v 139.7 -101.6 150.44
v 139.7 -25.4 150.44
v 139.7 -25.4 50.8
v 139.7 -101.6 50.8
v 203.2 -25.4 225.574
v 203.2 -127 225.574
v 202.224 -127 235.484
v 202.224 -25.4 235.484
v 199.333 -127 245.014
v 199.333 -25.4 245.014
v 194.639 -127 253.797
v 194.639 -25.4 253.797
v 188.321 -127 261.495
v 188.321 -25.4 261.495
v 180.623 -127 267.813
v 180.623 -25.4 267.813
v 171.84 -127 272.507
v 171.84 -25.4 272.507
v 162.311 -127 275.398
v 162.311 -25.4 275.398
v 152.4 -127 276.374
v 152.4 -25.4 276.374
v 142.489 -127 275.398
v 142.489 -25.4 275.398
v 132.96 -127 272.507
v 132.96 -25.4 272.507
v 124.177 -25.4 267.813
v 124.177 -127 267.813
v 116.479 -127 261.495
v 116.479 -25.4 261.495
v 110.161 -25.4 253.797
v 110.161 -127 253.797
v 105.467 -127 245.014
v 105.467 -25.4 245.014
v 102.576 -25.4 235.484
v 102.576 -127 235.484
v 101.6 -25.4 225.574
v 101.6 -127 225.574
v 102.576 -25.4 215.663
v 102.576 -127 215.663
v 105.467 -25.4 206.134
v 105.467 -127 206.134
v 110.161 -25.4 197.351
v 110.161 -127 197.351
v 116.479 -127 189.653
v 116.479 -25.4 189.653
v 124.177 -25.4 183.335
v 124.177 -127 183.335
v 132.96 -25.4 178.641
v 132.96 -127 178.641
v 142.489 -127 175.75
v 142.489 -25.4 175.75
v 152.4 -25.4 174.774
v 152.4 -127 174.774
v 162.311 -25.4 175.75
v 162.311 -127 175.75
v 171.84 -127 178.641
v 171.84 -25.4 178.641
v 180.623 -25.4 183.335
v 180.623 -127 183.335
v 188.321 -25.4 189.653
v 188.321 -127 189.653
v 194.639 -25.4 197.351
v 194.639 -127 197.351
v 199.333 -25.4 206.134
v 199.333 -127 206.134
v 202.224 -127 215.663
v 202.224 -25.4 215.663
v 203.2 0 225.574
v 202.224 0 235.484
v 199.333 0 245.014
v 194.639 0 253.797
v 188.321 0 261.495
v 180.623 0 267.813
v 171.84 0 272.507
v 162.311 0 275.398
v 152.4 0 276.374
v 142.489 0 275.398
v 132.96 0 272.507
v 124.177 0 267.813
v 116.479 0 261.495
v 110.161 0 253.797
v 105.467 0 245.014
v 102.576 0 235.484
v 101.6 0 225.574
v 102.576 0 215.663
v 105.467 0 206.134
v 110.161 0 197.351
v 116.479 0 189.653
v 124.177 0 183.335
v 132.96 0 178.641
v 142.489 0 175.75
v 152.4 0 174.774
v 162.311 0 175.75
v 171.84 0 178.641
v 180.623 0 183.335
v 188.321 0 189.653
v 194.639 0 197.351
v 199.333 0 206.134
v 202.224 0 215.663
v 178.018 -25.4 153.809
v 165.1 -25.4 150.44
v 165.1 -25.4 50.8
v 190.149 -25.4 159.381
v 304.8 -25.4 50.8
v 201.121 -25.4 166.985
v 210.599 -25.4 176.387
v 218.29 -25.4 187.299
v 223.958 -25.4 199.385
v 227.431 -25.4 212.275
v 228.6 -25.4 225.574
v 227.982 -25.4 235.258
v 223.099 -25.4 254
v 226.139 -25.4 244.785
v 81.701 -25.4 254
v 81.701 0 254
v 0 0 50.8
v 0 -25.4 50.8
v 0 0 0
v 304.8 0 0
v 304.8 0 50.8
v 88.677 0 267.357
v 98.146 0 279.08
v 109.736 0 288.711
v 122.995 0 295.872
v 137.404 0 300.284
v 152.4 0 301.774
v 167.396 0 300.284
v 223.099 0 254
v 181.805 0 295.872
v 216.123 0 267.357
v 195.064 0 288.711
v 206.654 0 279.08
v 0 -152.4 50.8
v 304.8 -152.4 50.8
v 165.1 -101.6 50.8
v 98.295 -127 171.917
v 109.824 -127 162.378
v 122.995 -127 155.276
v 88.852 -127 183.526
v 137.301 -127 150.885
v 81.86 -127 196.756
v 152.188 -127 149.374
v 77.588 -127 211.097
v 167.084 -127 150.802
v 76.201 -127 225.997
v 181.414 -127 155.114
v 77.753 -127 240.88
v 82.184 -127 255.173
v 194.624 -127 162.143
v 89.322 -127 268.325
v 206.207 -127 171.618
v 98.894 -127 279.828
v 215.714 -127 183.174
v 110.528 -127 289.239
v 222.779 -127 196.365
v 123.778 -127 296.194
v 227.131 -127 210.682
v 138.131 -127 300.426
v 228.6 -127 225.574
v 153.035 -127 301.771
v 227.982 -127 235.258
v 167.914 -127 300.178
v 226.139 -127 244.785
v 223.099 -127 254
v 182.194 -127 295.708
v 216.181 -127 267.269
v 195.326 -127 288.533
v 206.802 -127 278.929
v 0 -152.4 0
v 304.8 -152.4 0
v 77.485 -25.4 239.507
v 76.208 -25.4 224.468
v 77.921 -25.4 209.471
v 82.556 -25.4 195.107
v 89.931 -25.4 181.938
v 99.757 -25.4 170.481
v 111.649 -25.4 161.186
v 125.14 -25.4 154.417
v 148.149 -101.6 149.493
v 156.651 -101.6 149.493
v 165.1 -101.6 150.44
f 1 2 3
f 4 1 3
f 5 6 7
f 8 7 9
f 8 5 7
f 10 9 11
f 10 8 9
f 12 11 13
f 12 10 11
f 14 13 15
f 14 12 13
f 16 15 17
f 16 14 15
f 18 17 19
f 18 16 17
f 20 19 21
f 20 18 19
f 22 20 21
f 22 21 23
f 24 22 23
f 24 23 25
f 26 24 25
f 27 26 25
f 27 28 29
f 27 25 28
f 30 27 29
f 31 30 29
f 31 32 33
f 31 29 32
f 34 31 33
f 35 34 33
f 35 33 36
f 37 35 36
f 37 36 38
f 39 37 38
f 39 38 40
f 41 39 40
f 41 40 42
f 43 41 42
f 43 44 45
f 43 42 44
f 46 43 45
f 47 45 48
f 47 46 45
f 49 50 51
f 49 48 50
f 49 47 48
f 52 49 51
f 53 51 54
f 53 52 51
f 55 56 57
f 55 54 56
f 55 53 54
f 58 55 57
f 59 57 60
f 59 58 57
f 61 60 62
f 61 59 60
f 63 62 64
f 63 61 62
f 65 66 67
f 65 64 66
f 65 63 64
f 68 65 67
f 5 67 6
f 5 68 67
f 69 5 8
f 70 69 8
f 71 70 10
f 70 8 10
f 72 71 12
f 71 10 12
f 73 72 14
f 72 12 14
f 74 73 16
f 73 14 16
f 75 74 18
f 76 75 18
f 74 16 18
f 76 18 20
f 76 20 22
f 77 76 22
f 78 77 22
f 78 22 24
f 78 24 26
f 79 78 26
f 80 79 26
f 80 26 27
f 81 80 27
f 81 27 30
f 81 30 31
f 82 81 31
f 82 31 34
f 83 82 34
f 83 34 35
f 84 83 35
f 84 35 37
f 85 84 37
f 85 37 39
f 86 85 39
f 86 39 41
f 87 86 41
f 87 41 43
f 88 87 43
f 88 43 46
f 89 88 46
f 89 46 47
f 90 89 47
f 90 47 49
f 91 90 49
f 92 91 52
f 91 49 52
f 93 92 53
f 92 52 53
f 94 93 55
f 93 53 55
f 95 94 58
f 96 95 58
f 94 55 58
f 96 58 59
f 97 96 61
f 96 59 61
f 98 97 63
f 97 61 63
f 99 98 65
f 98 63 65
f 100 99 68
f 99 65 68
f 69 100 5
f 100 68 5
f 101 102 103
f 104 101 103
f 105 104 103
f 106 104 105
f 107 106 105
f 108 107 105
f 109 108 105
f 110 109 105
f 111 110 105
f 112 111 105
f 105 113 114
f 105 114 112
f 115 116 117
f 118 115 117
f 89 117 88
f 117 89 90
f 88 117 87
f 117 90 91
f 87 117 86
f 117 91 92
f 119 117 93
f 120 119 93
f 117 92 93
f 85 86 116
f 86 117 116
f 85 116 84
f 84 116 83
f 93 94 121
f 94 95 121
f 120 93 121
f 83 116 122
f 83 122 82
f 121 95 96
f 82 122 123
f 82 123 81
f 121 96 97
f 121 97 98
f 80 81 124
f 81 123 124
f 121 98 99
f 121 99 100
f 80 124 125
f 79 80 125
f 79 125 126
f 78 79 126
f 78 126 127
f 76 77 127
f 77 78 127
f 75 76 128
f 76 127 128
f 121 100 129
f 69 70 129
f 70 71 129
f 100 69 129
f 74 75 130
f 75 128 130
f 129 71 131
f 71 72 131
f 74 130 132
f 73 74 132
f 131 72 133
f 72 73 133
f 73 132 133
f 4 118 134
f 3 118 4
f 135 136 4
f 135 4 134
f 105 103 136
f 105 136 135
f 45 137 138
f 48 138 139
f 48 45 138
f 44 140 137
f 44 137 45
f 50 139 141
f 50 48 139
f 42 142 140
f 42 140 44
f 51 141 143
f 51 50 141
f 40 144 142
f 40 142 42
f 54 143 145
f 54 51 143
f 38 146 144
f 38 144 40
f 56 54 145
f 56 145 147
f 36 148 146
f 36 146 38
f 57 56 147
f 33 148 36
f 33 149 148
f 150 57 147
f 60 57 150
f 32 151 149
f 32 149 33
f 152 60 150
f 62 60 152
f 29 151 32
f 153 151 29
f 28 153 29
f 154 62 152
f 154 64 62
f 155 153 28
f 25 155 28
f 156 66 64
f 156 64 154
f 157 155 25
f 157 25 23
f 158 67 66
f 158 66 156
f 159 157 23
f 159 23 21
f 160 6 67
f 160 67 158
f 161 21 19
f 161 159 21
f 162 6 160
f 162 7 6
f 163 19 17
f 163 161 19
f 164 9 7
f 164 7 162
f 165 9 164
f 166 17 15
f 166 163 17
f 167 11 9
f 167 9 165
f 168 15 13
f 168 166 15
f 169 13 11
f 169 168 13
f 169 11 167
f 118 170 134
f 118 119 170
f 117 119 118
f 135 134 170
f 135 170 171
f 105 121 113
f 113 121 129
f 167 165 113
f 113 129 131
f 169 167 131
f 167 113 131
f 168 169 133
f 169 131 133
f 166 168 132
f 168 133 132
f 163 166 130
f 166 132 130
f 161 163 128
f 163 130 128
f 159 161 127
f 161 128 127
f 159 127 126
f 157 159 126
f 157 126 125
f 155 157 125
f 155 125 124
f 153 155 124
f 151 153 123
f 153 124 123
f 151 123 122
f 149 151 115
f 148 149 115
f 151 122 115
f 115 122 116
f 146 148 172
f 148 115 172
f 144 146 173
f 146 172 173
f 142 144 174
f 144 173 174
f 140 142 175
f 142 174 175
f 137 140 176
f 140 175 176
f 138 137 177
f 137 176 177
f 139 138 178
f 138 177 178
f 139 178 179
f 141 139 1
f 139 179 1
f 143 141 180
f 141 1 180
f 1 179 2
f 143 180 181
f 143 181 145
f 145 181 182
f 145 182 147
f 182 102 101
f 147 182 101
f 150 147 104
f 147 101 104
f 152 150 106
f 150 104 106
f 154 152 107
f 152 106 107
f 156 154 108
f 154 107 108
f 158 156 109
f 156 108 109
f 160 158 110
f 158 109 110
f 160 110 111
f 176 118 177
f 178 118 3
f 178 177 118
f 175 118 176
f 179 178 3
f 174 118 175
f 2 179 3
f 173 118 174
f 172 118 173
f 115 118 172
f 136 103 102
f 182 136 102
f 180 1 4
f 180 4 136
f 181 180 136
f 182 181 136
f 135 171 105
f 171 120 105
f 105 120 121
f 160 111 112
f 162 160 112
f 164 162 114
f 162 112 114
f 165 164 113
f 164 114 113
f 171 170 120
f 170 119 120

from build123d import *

# Parameters (mm, degrees)
F1_DEPTH      = 25.4
F2_W          = 304.8
F2_H          = 50.8
F3_DEPTH      = 127
F5_R          = 50.8
F6_DEPTH      = 25.401
F7_DEPTH      = 101.6
F8_DEPTH      = 127.001
F8_DEPTH_BACK = 25.401
F10_DEPTH     = 76.2


with BuildPart() as f1:
    # F0 (on Front) → F1 (new body)
    with BuildSketch(Plane.XZ):
        with BuildLine():
            Line((0, 50.8), (0, 0))
            Line((0, 0), (304.8, 0))
            Line((304.8, 0), (304.8, 50.8))
            Line((304.8, 50.8), (223.0993426351, 254))
            ThreePointArc((223.0993426351, 254), (152.4, 301.7739036981), (81.7006573649, 254))
            Line((81.7006573649, 254), (0, 50.8))
        make_face()
    extrude(amount=F1_DEPTH)

    # F2 (on face) → F3 (join)
    with BuildSketch(Plane.XZ.offset(25.4)):
        with Locations((152.4, 25.4)):
            Rectangle(F2_W, F2_H)
    extrude(amount=F3_DEPTH)

    # F5 (on face) → F6 (cut, through all)
    with BuildSketch(Plane.XZ.offset(25.4)):
        with Locations((152.4, 225.5739036981)):
            Circle(F5_R)
    extrude(amount=-F6_DEPTH, mode=Mode.SUBTRACT)

    # F4 (on face) → F7 (join)
    with BuildSketch(Plane.XZ.offset(25.4)):
        with BuildLine():
            ThreePointArc((81.7006573649, 254), (137.9232929986, 150.7617057996), (228.6, 225.5739036981))
            ThreePointArc((228.6, 225.5739036981), (227.2121978984, 240.0506106994), (223.0993426351, 254))
            ThreePointArc((223.0993426351, 254), (152.4, 301.7739036981), (81.7006573649, 254))
        make_face()
    extrude(amount=F7_DEPTH)

    # F5 (on face) → F8 (cut, two sides)
    with BuildSketch(Plane.XZ.offset(25.4)) as f8_sk:
        with Locations((152.4, 225.5739036981)):
            Circle(F5_R)
    extrude(amount=F8_DEPTH, mode=Mode.SUBTRACT)
    extrude(f8_sk.sketch, amount=-F8_DEPTH_BACK, mode=Mode.SUBTRACT)

    # F9 (on face) → F10 (join)
    with BuildSketch(Plane.XZ.offset(25.4)):
        with BuildLine():
            Line((139.7, 150.4396904527), (139.7, 50.8))
            Line((139.7, 50.8), (165.1, 50.8))
            Line((165.1, 50.8), (165.1, 150.4396904527))
            ThreePointArc((165.1, 150.4396904527), (152.4, 149.3739036981), (139.7, 150.4396904527))
        make_face()
    extrude(amount=F10_DEPTH)


solid = f1.part
